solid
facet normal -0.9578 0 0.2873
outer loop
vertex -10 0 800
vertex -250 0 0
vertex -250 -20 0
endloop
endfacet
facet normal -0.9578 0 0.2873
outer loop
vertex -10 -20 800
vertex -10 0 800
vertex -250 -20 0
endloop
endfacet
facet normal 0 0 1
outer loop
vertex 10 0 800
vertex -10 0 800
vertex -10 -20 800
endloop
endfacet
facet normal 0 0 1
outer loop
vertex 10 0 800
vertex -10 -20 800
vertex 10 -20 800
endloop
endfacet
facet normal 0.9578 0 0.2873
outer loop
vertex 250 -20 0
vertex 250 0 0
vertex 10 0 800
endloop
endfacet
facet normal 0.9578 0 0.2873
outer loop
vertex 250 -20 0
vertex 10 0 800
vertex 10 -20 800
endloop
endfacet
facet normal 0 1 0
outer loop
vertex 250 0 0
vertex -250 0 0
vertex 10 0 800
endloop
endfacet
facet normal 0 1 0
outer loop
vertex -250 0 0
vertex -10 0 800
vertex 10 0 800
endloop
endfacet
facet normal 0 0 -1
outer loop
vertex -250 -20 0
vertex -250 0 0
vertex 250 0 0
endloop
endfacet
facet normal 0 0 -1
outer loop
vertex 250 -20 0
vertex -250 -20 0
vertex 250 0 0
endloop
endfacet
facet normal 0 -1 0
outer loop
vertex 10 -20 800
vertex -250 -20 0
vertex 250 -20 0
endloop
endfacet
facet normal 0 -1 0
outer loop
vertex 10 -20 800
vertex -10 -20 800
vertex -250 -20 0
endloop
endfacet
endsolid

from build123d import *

# Parameters (mm, degrees)
F2_W     = 500
F2_H     = 800
F3_DEPTH = 20
F4_SIZE2 = 799.99999
F4_SIZE  = 239.99999


# Not quite as in the source:
# - a fillet or chamfer is up to 0.001 mm smaller than in the source, because OpenCascade refuses the exact size


with BuildPart() as f3:
    # F2 (on Front) → F3 (new body)
    with BuildSketch(Plane.XZ):
        with Locations((0, 400)):
            Rectangle(F2_W, F2_H)
    extrude(amount=F3_DEPTH)

    # F4 (size 240 and 800 in the source; OpenCascade refuses exactly that, so slightly less here)
    f4_edges = [f3.edges().sort_by_distance(p)[0] for p in [
        (250, -10, 800),
        (-250, -10, 800),
    ]]
    f4_side = f3.faces().sort_by_distance((0, -10, 800))[0]
    chamfer(f4_edges, length=F4_SIZE, length2=F4_SIZE2, reference=f4_side)


solid = f3.part
